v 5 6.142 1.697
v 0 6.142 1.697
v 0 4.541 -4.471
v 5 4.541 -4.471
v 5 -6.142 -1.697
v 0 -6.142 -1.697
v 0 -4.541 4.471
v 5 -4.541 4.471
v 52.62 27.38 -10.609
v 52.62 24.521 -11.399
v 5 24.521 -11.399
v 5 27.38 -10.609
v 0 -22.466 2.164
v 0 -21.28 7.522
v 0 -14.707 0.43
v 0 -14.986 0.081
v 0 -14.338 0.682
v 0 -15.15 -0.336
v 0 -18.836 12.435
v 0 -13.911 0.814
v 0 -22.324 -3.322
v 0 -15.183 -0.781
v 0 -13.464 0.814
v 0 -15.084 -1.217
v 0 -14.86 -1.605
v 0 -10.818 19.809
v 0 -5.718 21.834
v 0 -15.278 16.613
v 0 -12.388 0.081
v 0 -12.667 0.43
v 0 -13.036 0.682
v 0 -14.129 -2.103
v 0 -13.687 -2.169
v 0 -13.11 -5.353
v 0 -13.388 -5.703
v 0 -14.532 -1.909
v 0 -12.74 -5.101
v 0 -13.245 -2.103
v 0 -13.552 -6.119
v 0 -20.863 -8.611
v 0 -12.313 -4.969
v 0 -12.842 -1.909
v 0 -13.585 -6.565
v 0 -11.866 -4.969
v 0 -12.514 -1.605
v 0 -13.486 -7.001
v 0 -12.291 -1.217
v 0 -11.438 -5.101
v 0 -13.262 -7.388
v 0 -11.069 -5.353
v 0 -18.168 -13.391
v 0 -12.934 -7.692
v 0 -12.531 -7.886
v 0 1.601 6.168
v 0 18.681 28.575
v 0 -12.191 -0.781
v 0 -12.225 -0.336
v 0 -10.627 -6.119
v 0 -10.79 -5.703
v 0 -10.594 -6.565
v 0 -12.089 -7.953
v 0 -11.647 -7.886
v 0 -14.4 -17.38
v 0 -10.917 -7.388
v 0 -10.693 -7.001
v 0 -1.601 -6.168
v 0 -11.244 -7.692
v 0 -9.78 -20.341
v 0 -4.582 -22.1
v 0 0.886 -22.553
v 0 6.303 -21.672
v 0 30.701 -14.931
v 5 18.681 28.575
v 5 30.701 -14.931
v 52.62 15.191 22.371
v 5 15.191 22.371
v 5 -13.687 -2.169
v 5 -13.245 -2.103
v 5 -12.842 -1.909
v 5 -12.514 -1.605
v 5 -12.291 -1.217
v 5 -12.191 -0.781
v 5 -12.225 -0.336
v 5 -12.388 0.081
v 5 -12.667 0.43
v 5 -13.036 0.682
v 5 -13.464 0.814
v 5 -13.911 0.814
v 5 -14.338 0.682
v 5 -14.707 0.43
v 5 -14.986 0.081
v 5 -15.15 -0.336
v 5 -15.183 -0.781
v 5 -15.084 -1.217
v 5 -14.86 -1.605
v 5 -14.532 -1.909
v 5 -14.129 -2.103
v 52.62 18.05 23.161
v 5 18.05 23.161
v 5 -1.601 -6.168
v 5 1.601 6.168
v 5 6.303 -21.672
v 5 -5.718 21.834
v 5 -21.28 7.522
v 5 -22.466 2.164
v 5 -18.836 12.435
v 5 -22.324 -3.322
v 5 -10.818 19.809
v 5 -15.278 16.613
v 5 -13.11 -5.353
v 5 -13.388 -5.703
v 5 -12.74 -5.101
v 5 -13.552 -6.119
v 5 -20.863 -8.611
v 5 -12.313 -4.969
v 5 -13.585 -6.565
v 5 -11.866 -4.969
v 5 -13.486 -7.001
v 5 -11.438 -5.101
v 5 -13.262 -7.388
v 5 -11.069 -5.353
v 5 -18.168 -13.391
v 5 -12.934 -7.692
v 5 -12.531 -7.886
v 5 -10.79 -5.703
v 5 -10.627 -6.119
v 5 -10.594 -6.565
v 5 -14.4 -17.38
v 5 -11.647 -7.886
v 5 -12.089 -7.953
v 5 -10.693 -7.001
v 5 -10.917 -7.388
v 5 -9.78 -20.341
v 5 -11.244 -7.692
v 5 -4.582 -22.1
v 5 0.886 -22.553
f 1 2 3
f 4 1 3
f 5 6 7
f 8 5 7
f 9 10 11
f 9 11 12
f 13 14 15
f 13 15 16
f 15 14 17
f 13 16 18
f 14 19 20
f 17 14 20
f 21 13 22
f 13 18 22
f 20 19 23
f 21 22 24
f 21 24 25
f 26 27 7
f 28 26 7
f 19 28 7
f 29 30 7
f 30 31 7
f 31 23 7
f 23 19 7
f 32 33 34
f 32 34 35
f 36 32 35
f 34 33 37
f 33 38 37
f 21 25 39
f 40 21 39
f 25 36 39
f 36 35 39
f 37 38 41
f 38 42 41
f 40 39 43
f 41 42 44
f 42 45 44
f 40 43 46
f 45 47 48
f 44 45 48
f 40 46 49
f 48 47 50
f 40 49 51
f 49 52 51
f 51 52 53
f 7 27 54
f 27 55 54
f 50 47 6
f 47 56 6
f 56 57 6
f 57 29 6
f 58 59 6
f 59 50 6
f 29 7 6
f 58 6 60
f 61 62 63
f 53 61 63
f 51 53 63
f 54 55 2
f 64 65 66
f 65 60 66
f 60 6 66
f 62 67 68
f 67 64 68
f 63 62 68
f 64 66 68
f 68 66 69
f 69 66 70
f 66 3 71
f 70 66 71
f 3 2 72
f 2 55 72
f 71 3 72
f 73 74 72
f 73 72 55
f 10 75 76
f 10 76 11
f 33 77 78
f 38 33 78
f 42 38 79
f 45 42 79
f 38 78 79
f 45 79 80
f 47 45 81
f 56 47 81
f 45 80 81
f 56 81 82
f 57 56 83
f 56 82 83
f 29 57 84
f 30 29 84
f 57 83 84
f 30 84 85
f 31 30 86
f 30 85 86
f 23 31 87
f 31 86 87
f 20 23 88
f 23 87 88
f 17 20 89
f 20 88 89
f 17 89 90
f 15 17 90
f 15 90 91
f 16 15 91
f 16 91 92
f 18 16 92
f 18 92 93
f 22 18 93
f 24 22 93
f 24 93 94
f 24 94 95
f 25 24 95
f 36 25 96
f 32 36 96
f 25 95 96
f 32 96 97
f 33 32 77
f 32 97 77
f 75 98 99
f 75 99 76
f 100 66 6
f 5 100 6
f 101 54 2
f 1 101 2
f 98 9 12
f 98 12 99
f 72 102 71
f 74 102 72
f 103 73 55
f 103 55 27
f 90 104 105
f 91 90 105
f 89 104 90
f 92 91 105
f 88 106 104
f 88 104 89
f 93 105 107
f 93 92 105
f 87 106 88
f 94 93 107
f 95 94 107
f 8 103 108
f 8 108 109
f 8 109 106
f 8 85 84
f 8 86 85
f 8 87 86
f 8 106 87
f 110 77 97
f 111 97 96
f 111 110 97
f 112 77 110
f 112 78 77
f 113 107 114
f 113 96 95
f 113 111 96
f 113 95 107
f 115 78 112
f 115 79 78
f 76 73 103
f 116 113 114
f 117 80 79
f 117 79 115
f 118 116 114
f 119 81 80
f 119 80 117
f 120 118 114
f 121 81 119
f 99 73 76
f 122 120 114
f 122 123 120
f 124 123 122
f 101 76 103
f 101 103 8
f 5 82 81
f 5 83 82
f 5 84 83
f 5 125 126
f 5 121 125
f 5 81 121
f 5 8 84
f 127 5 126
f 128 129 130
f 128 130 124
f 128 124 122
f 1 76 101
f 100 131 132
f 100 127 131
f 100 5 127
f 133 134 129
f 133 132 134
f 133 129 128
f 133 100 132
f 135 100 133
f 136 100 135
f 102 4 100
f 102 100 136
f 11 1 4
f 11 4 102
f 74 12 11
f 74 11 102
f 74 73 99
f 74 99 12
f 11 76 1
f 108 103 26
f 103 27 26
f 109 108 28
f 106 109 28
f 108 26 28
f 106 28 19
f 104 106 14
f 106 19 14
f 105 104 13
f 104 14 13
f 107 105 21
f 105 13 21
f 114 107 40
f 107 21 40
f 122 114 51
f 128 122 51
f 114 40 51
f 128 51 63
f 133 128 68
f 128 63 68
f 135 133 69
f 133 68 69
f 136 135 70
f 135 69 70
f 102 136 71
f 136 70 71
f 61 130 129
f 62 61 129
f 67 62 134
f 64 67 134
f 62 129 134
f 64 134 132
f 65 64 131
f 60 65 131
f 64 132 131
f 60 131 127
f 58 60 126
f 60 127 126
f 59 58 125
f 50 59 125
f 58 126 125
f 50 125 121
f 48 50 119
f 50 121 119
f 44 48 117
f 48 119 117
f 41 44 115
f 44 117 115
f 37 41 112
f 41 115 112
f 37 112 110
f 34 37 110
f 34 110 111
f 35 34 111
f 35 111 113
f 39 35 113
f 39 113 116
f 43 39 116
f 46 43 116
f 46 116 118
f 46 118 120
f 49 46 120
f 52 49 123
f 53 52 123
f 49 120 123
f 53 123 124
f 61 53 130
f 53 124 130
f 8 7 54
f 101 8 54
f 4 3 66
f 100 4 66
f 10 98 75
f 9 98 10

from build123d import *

# Parameters (mm, degrees)
SKETCH1_R           = 22.57
BOSS_EXTRUDE1_DEPTH = 5
BOSS_EXTRUDE2_DEPTH = 5
CUT_EXTRUDE2_DEPTH  = 5
SKETCH5_R           = 1.5
CUT_EXTRUDE3_DEPTH  = 5
BOSS_EXTRUDE3_DEPTH = 47.62
CUT_EXTRUDE5_DEPTH  = 47.62


with BuildPart() as part:
    # Sketch1 → Boss-Extrude1 (new body)
    with BuildSketch(Plane(origin=(0, 0, 0), x_dir=(0, 0, -1), z_dir=(1, 0, 0))):
        Circle(SKETCH1_R)
    extrude(amount=BOSS_EXTRUDE1_DEPTH)

    # Sketch3 → Boss-Extrude2 (add)
    with BuildSketch(Plane(origin=(5, 0, 0), x_dir=(0, 0, -1), z_dir=(1, 0, 0))):
        Polygon((21.833735154, 5.717771349), (14.930960802, 30.701130063), (-28.574903185, 18.68068215), (-21.833735154, -5.717771349), align=None)
    extrude(amount=-BOSS_EXTRUDE2_DEPTH)

    # Sketch4 → Cut-Extrude2 (cut)
    with BuildSketch(Plane.ZY):
        Polygon((4.470755169, -4.540778658), (6.167807255, 1.601398221), (1.697052086, 6.142176879), (-4.470755169, 4.540778658), (-6.167807255, -1.601398221), (-1.697052086, -6.142176879), align=None)
    extrude(amount=-CUT_EXTRUDE2_DEPTH, mode=Mode.SUBTRACT)

    # Sketch5 → Cut-Extrude3 (cut)
    with BuildSketch(Plane(origin=(5, 0, 0), x_dir=(0, 0, -1), z_dir=(1, 0, 0))):
        with Locations((0.669304585, -13.687213536)):
            Circle(SKETCH5_R)
        with Locations((6.452618137, -12.089313553)):
            Circle(SKETCH5_R)
    extrude(amount=-CUT_EXTRUDE3_DEPTH, mode=Mode.SUBTRACT)

    # Sketch6 → Boss-Extrude3 (add)
    with BuildSketch(Plane(origin=(5, 0, 0), x_dir=(0, 0, -1), z_dir=(1, 0, 0))):
        Polygon((10.64416617, 27.44177556), (-23.222841897, 18.084494285), (-22.406311475, 15.129208279), (11.460696592, 24.486489554), align=None)
    extrude(amount=BOSS_EXTRUDE3_DEPTH)

    # Sketch7 → Cut-Extrude5 (cut)
    with BuildSketch(Plane(origin=(52.62, 0, 0), x_dir=(0, 0, -1), z_dir=(1, 0, 0))):
        Polygon((11.460696592, 24.486489554), (10.64416617, 27.44177556), (-23.222841897, 18.084494285), (-22.406311475, 15.129208279), align=None)
        Polygon((11.399186479, 24.521368001), (10.609287723, 27.380265447), (-23.161331784, 18.049615839), (-22.371433028, 15.190718392), align=None, mode=Mode.SUBTRACT)
    extrude(amount=-CUT_EXTRUDE5_DEPTH, mode=Mode.SUBTRACT)


solid = part.part
